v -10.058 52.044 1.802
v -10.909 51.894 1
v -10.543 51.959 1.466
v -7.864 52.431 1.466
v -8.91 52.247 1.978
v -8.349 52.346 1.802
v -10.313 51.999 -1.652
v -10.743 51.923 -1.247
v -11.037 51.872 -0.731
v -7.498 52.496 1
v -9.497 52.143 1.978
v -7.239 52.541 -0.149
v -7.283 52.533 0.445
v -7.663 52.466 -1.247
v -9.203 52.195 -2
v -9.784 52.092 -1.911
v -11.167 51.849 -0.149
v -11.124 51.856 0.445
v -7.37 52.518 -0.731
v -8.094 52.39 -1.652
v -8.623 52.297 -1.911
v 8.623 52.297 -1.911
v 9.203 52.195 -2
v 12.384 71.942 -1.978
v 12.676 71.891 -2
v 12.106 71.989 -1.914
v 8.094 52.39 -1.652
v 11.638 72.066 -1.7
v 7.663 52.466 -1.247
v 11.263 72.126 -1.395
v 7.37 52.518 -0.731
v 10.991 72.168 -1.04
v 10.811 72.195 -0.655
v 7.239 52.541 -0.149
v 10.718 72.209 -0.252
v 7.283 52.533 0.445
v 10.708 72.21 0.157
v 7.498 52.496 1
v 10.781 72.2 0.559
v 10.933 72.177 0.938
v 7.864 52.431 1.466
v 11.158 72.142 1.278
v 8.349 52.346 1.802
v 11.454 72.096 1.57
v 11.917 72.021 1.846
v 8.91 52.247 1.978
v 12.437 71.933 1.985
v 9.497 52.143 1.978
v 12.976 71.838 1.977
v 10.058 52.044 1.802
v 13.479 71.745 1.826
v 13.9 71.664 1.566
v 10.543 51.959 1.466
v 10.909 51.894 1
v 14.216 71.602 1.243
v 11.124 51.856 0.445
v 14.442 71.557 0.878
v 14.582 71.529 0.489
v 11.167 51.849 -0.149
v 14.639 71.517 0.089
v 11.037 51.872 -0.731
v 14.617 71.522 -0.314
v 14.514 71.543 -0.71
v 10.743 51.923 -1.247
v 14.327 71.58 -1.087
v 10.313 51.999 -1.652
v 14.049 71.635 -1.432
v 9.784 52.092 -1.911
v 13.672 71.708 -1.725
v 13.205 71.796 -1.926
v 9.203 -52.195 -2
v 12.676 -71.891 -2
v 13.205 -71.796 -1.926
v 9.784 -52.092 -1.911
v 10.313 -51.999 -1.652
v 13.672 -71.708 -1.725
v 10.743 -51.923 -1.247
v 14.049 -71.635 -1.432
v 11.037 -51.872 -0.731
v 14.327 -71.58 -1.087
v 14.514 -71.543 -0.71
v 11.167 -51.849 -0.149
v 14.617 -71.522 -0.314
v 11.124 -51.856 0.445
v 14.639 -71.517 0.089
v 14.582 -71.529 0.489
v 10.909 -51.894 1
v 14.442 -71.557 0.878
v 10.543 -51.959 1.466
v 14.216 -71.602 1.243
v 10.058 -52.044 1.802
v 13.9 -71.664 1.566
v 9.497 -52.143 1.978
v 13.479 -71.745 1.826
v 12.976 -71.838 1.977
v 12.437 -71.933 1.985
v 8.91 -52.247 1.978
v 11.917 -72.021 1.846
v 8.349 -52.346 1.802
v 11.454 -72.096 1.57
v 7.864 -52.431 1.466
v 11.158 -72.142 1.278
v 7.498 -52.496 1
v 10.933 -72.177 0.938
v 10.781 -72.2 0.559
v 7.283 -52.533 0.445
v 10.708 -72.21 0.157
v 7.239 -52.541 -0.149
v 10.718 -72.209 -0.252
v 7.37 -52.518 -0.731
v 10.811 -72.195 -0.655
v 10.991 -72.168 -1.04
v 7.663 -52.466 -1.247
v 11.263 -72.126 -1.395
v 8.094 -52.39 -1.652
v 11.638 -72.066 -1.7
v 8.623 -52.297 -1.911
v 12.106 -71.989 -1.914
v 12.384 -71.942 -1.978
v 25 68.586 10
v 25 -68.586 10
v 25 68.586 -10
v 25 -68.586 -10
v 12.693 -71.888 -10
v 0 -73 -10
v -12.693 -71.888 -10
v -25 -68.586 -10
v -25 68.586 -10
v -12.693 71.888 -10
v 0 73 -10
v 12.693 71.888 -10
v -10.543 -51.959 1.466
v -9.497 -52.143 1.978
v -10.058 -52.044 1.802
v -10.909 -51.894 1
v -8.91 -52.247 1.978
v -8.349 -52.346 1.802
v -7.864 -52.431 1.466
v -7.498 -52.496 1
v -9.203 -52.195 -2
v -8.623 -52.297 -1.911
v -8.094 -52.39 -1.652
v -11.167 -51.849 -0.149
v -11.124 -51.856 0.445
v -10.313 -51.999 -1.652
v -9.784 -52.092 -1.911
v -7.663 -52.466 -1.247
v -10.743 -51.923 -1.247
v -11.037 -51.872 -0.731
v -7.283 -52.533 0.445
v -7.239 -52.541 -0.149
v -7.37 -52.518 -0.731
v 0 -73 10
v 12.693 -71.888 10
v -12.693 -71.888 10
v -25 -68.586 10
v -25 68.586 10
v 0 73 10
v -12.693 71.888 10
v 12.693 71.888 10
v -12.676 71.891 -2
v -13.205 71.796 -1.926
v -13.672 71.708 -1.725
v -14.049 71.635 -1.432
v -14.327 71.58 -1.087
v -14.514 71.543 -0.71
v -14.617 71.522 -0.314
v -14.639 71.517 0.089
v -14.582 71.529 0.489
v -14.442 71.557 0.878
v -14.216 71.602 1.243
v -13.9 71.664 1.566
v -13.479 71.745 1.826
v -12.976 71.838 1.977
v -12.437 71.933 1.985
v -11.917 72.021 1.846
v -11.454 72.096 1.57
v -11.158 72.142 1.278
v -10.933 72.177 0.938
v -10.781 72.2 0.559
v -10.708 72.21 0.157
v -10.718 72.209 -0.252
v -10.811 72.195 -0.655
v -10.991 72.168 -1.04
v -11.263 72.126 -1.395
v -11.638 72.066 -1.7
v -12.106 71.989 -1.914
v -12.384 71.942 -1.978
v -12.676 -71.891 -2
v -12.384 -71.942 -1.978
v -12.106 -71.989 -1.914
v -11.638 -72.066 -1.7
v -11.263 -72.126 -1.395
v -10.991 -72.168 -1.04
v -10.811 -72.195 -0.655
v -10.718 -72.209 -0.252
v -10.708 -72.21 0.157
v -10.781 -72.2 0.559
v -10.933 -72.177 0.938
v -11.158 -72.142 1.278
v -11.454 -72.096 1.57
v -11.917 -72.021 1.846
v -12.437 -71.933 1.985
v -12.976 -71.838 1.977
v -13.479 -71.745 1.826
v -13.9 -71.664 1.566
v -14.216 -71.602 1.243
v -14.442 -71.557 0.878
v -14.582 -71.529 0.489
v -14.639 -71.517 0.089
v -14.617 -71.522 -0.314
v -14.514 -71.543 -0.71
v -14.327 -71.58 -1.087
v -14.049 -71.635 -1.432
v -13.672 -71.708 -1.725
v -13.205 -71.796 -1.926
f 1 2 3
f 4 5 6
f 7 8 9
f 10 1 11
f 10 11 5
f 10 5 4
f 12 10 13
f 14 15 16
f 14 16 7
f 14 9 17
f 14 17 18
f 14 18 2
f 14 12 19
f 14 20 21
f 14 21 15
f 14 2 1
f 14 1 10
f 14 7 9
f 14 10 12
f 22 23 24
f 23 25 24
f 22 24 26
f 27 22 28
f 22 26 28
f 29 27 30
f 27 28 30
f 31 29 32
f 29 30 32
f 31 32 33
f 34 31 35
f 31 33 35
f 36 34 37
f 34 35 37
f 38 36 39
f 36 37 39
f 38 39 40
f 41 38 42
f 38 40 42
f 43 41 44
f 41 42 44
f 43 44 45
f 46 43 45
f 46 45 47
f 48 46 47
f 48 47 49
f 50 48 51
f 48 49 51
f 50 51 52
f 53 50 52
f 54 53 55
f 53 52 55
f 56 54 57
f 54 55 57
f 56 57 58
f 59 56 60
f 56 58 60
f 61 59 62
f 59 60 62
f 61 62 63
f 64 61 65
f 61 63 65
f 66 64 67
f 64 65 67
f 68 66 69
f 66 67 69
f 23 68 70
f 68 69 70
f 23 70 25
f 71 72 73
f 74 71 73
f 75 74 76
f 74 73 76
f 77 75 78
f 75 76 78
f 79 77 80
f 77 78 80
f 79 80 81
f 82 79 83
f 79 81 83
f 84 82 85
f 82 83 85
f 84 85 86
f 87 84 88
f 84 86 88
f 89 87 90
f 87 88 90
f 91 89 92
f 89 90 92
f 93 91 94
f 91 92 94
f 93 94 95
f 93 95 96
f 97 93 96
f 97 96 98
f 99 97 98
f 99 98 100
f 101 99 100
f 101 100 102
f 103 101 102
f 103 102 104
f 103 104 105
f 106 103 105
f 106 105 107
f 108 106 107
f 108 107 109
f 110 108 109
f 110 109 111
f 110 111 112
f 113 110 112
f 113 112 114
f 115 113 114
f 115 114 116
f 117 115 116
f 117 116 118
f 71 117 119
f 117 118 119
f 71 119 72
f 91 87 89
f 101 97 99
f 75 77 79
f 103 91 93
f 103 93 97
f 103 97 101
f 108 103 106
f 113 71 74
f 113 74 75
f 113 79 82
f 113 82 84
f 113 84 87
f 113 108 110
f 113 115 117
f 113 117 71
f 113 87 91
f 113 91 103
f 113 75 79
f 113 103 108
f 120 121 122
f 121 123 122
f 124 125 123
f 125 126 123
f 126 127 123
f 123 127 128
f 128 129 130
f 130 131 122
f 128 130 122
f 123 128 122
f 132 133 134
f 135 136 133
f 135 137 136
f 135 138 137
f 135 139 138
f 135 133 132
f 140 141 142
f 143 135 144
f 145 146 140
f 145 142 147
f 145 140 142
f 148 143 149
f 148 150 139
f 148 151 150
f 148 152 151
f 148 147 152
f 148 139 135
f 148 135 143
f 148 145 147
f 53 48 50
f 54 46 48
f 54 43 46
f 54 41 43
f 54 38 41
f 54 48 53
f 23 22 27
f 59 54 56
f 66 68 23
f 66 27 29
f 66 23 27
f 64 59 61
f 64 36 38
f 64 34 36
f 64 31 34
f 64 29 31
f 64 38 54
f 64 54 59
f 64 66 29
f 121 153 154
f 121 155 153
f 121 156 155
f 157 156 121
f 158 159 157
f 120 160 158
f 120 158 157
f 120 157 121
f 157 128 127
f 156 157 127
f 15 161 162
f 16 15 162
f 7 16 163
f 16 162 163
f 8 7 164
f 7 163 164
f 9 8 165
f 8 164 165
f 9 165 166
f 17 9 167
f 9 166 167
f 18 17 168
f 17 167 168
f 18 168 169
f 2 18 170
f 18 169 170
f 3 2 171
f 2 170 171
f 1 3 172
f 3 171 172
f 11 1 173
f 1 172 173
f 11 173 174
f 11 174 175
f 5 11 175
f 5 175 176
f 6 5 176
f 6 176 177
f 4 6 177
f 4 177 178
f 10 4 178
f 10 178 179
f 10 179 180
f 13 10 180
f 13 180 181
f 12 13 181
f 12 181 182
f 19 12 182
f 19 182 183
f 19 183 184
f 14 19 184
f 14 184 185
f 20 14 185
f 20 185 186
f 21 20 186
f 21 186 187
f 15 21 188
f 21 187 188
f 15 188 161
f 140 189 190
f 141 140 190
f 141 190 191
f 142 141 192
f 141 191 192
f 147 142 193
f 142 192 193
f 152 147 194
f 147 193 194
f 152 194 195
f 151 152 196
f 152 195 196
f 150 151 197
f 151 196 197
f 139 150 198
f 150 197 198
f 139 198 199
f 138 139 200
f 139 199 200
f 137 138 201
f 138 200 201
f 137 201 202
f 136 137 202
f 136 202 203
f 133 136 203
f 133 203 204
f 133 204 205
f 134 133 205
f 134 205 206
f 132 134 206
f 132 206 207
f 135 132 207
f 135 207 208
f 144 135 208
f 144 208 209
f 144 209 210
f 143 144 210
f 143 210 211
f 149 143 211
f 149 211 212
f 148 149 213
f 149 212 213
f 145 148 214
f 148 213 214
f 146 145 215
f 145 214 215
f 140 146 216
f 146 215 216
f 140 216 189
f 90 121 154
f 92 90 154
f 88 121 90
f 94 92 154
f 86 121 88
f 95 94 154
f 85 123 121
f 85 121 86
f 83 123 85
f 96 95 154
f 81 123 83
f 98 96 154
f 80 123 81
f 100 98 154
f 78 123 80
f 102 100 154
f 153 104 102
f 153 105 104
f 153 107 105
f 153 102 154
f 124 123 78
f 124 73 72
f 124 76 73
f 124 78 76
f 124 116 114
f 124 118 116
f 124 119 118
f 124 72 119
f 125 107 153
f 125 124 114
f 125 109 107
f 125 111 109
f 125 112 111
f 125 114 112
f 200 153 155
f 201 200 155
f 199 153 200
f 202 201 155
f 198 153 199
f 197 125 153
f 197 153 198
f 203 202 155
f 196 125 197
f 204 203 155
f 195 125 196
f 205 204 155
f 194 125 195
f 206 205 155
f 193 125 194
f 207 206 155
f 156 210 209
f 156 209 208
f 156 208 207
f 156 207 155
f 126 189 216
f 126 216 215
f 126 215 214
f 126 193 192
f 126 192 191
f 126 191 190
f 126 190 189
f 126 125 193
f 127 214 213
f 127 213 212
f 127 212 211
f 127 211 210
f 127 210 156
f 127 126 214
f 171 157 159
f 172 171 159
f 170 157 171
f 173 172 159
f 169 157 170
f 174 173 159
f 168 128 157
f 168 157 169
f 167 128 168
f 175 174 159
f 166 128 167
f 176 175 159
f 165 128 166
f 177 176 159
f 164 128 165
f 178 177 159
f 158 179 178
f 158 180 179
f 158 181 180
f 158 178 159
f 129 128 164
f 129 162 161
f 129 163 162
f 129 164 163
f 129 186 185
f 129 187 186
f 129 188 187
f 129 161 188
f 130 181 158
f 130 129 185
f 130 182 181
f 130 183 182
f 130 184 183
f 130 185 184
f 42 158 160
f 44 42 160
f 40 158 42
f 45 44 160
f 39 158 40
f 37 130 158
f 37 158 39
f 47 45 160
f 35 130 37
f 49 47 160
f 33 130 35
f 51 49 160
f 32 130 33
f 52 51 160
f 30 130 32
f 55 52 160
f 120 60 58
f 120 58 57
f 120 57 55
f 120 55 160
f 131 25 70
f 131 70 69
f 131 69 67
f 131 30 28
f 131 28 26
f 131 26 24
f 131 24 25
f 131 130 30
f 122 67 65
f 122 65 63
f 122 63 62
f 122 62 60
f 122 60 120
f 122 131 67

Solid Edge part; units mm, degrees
sketch "Sketch1" plane through (0, 0, 0) normal (0, 0, 1) x (1, 0, 0)
  line L0 (25, -68.5857) -> (25, 68.5857)
  line L1 (-25, 68.5857) -> (-25, -68.5857)
  arc A0 (25, -68.5857) -> (-25, -68.5857) centre (0, 0) cw
  arc A1 (25, 68.5857) -> (-25, 68.5857) centre (0, 0) ccw
extrude "Protrusion1" add sketch "Sketch1" along normal mid plane 20
sketch "Sketch2" plane through (12.6763, -71.891, 0) normal (0.1736, -0.9848, 0) x (0, 0, -1)
  circle A0 centre (0, 0) radius 2
extrude "Wycięcie_1" cut sketch "Sketch2" against normal blind 20
mirror "Mirror1" about plane through (0, 0, 0) normal (1, 0, 0) of "Wycięcie_1"
mirror "Mirror2" about plane through (0, 0, 0) normal (0, -1, 0) of "Mirror1", "Wycięcie_1"
